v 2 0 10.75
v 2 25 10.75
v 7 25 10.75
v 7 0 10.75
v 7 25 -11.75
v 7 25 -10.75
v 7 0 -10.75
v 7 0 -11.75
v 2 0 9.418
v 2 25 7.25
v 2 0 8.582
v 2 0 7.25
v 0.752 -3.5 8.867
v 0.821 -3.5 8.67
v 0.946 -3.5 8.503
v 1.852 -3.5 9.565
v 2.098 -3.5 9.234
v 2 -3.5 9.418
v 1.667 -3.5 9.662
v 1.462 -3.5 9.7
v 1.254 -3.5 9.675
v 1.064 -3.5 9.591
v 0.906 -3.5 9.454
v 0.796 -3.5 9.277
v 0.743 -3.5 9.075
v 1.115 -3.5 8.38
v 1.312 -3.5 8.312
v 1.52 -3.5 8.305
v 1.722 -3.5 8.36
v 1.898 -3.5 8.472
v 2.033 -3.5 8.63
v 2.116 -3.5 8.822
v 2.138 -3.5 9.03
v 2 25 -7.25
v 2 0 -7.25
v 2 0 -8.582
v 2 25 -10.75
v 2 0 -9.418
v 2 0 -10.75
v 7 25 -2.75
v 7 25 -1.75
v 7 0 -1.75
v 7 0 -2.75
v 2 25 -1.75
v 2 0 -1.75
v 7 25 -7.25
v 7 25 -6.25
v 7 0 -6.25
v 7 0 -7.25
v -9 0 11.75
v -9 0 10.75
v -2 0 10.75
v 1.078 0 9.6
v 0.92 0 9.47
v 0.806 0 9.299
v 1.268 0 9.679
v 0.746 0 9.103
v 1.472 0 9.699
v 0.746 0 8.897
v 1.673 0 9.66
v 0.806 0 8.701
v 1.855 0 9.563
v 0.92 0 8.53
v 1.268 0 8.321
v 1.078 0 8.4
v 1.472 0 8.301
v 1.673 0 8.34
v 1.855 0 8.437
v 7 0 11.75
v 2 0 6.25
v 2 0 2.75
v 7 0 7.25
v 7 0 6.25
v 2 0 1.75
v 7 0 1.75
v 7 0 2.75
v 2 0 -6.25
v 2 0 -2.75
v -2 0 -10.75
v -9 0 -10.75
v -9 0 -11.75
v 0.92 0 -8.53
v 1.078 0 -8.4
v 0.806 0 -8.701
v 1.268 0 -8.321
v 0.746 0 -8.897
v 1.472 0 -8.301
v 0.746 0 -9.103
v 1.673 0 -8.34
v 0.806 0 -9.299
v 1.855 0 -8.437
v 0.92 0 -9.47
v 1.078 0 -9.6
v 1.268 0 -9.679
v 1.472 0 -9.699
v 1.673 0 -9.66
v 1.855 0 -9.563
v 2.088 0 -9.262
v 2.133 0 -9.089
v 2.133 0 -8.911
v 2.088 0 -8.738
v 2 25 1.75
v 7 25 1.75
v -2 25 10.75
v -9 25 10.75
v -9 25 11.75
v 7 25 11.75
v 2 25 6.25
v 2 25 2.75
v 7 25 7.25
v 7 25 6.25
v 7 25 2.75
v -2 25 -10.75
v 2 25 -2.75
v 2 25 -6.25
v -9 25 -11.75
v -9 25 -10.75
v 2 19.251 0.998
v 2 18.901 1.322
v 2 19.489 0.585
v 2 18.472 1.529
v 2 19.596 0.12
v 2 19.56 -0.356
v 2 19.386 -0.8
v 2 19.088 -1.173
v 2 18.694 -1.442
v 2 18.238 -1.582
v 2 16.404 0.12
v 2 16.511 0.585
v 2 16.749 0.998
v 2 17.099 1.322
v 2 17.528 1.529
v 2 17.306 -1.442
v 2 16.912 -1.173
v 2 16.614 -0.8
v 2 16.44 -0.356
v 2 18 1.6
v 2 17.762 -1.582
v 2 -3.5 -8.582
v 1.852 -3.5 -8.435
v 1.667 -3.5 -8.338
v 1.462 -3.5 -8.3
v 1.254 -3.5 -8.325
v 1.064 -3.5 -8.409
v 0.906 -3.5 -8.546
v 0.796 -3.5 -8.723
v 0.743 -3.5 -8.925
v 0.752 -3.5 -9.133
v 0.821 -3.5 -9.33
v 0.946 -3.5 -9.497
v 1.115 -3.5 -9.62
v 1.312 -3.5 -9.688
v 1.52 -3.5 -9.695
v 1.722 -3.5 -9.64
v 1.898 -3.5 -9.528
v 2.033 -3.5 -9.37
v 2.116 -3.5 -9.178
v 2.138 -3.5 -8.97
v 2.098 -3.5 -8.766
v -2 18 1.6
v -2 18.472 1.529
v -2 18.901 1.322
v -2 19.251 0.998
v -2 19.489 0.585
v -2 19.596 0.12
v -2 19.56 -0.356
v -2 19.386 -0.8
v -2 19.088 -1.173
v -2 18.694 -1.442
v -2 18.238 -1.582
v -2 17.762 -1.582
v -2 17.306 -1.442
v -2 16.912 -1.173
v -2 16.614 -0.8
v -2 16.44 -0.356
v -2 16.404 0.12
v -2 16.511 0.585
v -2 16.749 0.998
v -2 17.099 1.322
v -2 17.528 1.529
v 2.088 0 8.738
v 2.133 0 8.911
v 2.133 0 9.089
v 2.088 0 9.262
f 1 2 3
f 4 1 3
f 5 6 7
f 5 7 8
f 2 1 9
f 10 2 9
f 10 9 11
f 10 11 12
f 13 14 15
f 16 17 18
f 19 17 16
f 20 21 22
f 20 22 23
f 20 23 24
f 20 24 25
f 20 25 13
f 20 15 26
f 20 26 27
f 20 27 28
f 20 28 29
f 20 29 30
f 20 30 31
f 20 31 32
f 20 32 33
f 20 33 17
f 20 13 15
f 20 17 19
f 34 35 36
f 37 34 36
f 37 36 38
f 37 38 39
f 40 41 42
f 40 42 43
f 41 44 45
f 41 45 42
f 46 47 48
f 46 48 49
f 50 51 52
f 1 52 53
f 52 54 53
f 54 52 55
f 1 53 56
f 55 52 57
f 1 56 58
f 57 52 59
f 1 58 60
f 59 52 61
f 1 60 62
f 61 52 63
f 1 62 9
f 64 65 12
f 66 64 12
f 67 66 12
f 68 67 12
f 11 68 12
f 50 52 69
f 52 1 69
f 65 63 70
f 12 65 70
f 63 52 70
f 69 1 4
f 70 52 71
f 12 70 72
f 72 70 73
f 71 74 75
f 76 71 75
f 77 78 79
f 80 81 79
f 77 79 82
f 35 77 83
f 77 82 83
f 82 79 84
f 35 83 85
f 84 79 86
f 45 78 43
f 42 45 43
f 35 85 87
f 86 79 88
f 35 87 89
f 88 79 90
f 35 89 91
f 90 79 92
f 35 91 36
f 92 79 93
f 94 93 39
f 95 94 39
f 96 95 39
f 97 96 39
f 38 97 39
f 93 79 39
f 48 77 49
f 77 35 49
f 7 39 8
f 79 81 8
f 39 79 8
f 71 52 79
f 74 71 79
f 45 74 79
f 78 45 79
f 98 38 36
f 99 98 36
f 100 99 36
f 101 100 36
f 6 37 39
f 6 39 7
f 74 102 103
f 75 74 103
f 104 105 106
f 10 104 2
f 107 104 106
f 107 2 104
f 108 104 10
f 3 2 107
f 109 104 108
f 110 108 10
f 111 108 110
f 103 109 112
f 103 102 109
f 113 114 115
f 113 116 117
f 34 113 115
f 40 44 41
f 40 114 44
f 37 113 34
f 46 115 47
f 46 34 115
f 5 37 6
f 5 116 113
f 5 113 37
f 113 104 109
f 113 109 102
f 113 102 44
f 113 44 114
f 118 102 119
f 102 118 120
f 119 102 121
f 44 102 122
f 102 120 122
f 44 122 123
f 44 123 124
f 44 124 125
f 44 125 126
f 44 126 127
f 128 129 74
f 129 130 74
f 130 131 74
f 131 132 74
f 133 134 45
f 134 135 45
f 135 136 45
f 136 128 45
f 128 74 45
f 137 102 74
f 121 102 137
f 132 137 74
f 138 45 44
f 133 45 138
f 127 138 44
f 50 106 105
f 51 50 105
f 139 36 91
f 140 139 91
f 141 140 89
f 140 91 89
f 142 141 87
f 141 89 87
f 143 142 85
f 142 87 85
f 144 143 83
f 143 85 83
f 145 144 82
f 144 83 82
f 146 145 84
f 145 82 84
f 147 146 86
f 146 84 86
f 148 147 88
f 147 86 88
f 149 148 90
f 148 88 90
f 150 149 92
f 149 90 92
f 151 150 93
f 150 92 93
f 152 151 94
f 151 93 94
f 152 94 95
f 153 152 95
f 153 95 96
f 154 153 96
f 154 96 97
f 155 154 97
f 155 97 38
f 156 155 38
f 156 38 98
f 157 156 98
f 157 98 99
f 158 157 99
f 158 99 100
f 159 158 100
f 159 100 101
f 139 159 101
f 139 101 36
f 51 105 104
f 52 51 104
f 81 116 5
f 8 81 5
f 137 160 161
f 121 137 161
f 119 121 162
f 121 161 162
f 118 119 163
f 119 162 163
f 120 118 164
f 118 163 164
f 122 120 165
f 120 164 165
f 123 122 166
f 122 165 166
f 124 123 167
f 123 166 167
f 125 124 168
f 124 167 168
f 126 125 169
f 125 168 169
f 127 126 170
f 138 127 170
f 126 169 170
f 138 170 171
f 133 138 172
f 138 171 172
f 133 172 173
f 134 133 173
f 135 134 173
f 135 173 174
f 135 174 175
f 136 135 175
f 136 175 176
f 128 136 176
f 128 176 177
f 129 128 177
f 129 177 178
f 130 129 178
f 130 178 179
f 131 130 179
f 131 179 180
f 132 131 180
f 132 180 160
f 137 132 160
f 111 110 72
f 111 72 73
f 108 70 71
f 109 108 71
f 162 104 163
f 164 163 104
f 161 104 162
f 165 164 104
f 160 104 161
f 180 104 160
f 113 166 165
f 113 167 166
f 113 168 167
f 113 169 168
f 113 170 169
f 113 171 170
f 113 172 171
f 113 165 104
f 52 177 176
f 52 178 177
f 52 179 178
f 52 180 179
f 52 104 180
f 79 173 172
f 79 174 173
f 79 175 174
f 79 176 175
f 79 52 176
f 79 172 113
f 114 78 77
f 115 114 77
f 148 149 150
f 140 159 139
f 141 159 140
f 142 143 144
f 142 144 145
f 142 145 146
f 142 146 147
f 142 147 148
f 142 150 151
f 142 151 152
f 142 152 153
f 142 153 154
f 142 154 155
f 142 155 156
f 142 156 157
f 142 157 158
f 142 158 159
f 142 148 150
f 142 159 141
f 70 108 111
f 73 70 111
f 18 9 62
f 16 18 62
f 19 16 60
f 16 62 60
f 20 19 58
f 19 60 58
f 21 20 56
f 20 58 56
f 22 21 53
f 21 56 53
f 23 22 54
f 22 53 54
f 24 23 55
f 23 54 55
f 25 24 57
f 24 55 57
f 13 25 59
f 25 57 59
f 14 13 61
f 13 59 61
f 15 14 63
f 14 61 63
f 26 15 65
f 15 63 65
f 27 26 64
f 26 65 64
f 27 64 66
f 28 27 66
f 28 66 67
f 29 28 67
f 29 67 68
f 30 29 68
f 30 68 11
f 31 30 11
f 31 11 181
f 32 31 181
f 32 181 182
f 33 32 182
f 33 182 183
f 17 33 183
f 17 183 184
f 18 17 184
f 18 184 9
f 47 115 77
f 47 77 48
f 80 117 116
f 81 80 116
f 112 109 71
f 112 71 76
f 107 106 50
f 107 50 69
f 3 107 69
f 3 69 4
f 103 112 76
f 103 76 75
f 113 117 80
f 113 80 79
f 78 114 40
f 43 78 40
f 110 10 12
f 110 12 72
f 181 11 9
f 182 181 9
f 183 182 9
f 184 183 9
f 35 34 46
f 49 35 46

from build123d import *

# Parameters (mm, degrees)
SKETCH1_W           = 4
SKETCH1_H           = 23.5
BOSS_EXTRUDE1_DEPTH = 25
SKETCH2_W           = 5
SKETCH2_H           = 1
SKETCH2_W_2         = 7
BOSS_EXTRUDE2_DEPTH = 25
SKETCH3_R           = 1.6
CUT_EXTRUDE1_DEPTH  = 25
SKETCH4_R           = 0.7
BOSS_EXTRUDE3_DEPTH = 3.5


with BuildPart() as part:
    # Sketch1 → Boss-Extrude1 (new body)
    with BuildSketch(Plane(origin=(0, 0, 0), x_dir=(1, 0, 0), z_dir=(0, 1, 0))):
        Rectangle(SKETCH1_W, SKETCH1_H)
    extrude(amount=BOSS_EXTRUDE1_DEPTH)

    # Sketch2 → Boss-Extrude2 (add)
    with BuildSketch(Plane(origin=(0, 25, 0), x_dir=(1, 0, 0), z_dir=(0, 1, 0))):
        with Locations((4.5, -11.25)):
            Rectangle(SKETCH2_W, SKETCH2_H)
        with Locations((-5.5, -11.25)):
            Rectangle(SKETCH2_W_2, SKETCH2_H)
        with Locations((-5.5, 11.25)):
            Rectangle(SKETCH2_W_2, SKETCH2_H)
        with Locations((4.5, 11.25)):
            Rectangle(SKETCH2_W, SKETCH2_H)
        with Locations((4.5, 6.75)):
            Rectangle(SKETCH2_W, SKETCH2_H)
        with Locations((4.5, 2.25)):
            Rectangle(SKETCH2_W, SKETCH2_H)
        with Locations((4.5, -2.25)):
            Rectangle(SKETCH2_W, SKETCH2_H)
        with Locations((4.5, -6.75)):
            Rectangle(SKETCH2_W, SKETCH2_H)
    extrude(amount=-BOSS_EXTRUDE2_DEPTH)

    # Sketch3 → Cut-Extrude1 (cut)
    with BuildSketch(Plane.ZY.offset(2)):
        with Locations((0, 18)):
            Circle(SKETCH3_R)
    extrude(amount=-CUT_EXTRUDE1_DEPTH, mode=Mode.SUBTRACT)

    # Sketch4 → Boss-Extrude3 (add)
    with BuildSketch(Plane.XZ):
        with Locations(Location((1.43876577, 9, 0), (0, 0, 36.701194363))):
            Circle(SKETCH4_R)
        with Locations(Location((1.43876577, -9, 0), (0, 0, 36.701194363))):
            Circle(SKETCH4_R)
    extrude(amount=BOSS_EXTRUDE3_DEPTH)


solid = part.part
